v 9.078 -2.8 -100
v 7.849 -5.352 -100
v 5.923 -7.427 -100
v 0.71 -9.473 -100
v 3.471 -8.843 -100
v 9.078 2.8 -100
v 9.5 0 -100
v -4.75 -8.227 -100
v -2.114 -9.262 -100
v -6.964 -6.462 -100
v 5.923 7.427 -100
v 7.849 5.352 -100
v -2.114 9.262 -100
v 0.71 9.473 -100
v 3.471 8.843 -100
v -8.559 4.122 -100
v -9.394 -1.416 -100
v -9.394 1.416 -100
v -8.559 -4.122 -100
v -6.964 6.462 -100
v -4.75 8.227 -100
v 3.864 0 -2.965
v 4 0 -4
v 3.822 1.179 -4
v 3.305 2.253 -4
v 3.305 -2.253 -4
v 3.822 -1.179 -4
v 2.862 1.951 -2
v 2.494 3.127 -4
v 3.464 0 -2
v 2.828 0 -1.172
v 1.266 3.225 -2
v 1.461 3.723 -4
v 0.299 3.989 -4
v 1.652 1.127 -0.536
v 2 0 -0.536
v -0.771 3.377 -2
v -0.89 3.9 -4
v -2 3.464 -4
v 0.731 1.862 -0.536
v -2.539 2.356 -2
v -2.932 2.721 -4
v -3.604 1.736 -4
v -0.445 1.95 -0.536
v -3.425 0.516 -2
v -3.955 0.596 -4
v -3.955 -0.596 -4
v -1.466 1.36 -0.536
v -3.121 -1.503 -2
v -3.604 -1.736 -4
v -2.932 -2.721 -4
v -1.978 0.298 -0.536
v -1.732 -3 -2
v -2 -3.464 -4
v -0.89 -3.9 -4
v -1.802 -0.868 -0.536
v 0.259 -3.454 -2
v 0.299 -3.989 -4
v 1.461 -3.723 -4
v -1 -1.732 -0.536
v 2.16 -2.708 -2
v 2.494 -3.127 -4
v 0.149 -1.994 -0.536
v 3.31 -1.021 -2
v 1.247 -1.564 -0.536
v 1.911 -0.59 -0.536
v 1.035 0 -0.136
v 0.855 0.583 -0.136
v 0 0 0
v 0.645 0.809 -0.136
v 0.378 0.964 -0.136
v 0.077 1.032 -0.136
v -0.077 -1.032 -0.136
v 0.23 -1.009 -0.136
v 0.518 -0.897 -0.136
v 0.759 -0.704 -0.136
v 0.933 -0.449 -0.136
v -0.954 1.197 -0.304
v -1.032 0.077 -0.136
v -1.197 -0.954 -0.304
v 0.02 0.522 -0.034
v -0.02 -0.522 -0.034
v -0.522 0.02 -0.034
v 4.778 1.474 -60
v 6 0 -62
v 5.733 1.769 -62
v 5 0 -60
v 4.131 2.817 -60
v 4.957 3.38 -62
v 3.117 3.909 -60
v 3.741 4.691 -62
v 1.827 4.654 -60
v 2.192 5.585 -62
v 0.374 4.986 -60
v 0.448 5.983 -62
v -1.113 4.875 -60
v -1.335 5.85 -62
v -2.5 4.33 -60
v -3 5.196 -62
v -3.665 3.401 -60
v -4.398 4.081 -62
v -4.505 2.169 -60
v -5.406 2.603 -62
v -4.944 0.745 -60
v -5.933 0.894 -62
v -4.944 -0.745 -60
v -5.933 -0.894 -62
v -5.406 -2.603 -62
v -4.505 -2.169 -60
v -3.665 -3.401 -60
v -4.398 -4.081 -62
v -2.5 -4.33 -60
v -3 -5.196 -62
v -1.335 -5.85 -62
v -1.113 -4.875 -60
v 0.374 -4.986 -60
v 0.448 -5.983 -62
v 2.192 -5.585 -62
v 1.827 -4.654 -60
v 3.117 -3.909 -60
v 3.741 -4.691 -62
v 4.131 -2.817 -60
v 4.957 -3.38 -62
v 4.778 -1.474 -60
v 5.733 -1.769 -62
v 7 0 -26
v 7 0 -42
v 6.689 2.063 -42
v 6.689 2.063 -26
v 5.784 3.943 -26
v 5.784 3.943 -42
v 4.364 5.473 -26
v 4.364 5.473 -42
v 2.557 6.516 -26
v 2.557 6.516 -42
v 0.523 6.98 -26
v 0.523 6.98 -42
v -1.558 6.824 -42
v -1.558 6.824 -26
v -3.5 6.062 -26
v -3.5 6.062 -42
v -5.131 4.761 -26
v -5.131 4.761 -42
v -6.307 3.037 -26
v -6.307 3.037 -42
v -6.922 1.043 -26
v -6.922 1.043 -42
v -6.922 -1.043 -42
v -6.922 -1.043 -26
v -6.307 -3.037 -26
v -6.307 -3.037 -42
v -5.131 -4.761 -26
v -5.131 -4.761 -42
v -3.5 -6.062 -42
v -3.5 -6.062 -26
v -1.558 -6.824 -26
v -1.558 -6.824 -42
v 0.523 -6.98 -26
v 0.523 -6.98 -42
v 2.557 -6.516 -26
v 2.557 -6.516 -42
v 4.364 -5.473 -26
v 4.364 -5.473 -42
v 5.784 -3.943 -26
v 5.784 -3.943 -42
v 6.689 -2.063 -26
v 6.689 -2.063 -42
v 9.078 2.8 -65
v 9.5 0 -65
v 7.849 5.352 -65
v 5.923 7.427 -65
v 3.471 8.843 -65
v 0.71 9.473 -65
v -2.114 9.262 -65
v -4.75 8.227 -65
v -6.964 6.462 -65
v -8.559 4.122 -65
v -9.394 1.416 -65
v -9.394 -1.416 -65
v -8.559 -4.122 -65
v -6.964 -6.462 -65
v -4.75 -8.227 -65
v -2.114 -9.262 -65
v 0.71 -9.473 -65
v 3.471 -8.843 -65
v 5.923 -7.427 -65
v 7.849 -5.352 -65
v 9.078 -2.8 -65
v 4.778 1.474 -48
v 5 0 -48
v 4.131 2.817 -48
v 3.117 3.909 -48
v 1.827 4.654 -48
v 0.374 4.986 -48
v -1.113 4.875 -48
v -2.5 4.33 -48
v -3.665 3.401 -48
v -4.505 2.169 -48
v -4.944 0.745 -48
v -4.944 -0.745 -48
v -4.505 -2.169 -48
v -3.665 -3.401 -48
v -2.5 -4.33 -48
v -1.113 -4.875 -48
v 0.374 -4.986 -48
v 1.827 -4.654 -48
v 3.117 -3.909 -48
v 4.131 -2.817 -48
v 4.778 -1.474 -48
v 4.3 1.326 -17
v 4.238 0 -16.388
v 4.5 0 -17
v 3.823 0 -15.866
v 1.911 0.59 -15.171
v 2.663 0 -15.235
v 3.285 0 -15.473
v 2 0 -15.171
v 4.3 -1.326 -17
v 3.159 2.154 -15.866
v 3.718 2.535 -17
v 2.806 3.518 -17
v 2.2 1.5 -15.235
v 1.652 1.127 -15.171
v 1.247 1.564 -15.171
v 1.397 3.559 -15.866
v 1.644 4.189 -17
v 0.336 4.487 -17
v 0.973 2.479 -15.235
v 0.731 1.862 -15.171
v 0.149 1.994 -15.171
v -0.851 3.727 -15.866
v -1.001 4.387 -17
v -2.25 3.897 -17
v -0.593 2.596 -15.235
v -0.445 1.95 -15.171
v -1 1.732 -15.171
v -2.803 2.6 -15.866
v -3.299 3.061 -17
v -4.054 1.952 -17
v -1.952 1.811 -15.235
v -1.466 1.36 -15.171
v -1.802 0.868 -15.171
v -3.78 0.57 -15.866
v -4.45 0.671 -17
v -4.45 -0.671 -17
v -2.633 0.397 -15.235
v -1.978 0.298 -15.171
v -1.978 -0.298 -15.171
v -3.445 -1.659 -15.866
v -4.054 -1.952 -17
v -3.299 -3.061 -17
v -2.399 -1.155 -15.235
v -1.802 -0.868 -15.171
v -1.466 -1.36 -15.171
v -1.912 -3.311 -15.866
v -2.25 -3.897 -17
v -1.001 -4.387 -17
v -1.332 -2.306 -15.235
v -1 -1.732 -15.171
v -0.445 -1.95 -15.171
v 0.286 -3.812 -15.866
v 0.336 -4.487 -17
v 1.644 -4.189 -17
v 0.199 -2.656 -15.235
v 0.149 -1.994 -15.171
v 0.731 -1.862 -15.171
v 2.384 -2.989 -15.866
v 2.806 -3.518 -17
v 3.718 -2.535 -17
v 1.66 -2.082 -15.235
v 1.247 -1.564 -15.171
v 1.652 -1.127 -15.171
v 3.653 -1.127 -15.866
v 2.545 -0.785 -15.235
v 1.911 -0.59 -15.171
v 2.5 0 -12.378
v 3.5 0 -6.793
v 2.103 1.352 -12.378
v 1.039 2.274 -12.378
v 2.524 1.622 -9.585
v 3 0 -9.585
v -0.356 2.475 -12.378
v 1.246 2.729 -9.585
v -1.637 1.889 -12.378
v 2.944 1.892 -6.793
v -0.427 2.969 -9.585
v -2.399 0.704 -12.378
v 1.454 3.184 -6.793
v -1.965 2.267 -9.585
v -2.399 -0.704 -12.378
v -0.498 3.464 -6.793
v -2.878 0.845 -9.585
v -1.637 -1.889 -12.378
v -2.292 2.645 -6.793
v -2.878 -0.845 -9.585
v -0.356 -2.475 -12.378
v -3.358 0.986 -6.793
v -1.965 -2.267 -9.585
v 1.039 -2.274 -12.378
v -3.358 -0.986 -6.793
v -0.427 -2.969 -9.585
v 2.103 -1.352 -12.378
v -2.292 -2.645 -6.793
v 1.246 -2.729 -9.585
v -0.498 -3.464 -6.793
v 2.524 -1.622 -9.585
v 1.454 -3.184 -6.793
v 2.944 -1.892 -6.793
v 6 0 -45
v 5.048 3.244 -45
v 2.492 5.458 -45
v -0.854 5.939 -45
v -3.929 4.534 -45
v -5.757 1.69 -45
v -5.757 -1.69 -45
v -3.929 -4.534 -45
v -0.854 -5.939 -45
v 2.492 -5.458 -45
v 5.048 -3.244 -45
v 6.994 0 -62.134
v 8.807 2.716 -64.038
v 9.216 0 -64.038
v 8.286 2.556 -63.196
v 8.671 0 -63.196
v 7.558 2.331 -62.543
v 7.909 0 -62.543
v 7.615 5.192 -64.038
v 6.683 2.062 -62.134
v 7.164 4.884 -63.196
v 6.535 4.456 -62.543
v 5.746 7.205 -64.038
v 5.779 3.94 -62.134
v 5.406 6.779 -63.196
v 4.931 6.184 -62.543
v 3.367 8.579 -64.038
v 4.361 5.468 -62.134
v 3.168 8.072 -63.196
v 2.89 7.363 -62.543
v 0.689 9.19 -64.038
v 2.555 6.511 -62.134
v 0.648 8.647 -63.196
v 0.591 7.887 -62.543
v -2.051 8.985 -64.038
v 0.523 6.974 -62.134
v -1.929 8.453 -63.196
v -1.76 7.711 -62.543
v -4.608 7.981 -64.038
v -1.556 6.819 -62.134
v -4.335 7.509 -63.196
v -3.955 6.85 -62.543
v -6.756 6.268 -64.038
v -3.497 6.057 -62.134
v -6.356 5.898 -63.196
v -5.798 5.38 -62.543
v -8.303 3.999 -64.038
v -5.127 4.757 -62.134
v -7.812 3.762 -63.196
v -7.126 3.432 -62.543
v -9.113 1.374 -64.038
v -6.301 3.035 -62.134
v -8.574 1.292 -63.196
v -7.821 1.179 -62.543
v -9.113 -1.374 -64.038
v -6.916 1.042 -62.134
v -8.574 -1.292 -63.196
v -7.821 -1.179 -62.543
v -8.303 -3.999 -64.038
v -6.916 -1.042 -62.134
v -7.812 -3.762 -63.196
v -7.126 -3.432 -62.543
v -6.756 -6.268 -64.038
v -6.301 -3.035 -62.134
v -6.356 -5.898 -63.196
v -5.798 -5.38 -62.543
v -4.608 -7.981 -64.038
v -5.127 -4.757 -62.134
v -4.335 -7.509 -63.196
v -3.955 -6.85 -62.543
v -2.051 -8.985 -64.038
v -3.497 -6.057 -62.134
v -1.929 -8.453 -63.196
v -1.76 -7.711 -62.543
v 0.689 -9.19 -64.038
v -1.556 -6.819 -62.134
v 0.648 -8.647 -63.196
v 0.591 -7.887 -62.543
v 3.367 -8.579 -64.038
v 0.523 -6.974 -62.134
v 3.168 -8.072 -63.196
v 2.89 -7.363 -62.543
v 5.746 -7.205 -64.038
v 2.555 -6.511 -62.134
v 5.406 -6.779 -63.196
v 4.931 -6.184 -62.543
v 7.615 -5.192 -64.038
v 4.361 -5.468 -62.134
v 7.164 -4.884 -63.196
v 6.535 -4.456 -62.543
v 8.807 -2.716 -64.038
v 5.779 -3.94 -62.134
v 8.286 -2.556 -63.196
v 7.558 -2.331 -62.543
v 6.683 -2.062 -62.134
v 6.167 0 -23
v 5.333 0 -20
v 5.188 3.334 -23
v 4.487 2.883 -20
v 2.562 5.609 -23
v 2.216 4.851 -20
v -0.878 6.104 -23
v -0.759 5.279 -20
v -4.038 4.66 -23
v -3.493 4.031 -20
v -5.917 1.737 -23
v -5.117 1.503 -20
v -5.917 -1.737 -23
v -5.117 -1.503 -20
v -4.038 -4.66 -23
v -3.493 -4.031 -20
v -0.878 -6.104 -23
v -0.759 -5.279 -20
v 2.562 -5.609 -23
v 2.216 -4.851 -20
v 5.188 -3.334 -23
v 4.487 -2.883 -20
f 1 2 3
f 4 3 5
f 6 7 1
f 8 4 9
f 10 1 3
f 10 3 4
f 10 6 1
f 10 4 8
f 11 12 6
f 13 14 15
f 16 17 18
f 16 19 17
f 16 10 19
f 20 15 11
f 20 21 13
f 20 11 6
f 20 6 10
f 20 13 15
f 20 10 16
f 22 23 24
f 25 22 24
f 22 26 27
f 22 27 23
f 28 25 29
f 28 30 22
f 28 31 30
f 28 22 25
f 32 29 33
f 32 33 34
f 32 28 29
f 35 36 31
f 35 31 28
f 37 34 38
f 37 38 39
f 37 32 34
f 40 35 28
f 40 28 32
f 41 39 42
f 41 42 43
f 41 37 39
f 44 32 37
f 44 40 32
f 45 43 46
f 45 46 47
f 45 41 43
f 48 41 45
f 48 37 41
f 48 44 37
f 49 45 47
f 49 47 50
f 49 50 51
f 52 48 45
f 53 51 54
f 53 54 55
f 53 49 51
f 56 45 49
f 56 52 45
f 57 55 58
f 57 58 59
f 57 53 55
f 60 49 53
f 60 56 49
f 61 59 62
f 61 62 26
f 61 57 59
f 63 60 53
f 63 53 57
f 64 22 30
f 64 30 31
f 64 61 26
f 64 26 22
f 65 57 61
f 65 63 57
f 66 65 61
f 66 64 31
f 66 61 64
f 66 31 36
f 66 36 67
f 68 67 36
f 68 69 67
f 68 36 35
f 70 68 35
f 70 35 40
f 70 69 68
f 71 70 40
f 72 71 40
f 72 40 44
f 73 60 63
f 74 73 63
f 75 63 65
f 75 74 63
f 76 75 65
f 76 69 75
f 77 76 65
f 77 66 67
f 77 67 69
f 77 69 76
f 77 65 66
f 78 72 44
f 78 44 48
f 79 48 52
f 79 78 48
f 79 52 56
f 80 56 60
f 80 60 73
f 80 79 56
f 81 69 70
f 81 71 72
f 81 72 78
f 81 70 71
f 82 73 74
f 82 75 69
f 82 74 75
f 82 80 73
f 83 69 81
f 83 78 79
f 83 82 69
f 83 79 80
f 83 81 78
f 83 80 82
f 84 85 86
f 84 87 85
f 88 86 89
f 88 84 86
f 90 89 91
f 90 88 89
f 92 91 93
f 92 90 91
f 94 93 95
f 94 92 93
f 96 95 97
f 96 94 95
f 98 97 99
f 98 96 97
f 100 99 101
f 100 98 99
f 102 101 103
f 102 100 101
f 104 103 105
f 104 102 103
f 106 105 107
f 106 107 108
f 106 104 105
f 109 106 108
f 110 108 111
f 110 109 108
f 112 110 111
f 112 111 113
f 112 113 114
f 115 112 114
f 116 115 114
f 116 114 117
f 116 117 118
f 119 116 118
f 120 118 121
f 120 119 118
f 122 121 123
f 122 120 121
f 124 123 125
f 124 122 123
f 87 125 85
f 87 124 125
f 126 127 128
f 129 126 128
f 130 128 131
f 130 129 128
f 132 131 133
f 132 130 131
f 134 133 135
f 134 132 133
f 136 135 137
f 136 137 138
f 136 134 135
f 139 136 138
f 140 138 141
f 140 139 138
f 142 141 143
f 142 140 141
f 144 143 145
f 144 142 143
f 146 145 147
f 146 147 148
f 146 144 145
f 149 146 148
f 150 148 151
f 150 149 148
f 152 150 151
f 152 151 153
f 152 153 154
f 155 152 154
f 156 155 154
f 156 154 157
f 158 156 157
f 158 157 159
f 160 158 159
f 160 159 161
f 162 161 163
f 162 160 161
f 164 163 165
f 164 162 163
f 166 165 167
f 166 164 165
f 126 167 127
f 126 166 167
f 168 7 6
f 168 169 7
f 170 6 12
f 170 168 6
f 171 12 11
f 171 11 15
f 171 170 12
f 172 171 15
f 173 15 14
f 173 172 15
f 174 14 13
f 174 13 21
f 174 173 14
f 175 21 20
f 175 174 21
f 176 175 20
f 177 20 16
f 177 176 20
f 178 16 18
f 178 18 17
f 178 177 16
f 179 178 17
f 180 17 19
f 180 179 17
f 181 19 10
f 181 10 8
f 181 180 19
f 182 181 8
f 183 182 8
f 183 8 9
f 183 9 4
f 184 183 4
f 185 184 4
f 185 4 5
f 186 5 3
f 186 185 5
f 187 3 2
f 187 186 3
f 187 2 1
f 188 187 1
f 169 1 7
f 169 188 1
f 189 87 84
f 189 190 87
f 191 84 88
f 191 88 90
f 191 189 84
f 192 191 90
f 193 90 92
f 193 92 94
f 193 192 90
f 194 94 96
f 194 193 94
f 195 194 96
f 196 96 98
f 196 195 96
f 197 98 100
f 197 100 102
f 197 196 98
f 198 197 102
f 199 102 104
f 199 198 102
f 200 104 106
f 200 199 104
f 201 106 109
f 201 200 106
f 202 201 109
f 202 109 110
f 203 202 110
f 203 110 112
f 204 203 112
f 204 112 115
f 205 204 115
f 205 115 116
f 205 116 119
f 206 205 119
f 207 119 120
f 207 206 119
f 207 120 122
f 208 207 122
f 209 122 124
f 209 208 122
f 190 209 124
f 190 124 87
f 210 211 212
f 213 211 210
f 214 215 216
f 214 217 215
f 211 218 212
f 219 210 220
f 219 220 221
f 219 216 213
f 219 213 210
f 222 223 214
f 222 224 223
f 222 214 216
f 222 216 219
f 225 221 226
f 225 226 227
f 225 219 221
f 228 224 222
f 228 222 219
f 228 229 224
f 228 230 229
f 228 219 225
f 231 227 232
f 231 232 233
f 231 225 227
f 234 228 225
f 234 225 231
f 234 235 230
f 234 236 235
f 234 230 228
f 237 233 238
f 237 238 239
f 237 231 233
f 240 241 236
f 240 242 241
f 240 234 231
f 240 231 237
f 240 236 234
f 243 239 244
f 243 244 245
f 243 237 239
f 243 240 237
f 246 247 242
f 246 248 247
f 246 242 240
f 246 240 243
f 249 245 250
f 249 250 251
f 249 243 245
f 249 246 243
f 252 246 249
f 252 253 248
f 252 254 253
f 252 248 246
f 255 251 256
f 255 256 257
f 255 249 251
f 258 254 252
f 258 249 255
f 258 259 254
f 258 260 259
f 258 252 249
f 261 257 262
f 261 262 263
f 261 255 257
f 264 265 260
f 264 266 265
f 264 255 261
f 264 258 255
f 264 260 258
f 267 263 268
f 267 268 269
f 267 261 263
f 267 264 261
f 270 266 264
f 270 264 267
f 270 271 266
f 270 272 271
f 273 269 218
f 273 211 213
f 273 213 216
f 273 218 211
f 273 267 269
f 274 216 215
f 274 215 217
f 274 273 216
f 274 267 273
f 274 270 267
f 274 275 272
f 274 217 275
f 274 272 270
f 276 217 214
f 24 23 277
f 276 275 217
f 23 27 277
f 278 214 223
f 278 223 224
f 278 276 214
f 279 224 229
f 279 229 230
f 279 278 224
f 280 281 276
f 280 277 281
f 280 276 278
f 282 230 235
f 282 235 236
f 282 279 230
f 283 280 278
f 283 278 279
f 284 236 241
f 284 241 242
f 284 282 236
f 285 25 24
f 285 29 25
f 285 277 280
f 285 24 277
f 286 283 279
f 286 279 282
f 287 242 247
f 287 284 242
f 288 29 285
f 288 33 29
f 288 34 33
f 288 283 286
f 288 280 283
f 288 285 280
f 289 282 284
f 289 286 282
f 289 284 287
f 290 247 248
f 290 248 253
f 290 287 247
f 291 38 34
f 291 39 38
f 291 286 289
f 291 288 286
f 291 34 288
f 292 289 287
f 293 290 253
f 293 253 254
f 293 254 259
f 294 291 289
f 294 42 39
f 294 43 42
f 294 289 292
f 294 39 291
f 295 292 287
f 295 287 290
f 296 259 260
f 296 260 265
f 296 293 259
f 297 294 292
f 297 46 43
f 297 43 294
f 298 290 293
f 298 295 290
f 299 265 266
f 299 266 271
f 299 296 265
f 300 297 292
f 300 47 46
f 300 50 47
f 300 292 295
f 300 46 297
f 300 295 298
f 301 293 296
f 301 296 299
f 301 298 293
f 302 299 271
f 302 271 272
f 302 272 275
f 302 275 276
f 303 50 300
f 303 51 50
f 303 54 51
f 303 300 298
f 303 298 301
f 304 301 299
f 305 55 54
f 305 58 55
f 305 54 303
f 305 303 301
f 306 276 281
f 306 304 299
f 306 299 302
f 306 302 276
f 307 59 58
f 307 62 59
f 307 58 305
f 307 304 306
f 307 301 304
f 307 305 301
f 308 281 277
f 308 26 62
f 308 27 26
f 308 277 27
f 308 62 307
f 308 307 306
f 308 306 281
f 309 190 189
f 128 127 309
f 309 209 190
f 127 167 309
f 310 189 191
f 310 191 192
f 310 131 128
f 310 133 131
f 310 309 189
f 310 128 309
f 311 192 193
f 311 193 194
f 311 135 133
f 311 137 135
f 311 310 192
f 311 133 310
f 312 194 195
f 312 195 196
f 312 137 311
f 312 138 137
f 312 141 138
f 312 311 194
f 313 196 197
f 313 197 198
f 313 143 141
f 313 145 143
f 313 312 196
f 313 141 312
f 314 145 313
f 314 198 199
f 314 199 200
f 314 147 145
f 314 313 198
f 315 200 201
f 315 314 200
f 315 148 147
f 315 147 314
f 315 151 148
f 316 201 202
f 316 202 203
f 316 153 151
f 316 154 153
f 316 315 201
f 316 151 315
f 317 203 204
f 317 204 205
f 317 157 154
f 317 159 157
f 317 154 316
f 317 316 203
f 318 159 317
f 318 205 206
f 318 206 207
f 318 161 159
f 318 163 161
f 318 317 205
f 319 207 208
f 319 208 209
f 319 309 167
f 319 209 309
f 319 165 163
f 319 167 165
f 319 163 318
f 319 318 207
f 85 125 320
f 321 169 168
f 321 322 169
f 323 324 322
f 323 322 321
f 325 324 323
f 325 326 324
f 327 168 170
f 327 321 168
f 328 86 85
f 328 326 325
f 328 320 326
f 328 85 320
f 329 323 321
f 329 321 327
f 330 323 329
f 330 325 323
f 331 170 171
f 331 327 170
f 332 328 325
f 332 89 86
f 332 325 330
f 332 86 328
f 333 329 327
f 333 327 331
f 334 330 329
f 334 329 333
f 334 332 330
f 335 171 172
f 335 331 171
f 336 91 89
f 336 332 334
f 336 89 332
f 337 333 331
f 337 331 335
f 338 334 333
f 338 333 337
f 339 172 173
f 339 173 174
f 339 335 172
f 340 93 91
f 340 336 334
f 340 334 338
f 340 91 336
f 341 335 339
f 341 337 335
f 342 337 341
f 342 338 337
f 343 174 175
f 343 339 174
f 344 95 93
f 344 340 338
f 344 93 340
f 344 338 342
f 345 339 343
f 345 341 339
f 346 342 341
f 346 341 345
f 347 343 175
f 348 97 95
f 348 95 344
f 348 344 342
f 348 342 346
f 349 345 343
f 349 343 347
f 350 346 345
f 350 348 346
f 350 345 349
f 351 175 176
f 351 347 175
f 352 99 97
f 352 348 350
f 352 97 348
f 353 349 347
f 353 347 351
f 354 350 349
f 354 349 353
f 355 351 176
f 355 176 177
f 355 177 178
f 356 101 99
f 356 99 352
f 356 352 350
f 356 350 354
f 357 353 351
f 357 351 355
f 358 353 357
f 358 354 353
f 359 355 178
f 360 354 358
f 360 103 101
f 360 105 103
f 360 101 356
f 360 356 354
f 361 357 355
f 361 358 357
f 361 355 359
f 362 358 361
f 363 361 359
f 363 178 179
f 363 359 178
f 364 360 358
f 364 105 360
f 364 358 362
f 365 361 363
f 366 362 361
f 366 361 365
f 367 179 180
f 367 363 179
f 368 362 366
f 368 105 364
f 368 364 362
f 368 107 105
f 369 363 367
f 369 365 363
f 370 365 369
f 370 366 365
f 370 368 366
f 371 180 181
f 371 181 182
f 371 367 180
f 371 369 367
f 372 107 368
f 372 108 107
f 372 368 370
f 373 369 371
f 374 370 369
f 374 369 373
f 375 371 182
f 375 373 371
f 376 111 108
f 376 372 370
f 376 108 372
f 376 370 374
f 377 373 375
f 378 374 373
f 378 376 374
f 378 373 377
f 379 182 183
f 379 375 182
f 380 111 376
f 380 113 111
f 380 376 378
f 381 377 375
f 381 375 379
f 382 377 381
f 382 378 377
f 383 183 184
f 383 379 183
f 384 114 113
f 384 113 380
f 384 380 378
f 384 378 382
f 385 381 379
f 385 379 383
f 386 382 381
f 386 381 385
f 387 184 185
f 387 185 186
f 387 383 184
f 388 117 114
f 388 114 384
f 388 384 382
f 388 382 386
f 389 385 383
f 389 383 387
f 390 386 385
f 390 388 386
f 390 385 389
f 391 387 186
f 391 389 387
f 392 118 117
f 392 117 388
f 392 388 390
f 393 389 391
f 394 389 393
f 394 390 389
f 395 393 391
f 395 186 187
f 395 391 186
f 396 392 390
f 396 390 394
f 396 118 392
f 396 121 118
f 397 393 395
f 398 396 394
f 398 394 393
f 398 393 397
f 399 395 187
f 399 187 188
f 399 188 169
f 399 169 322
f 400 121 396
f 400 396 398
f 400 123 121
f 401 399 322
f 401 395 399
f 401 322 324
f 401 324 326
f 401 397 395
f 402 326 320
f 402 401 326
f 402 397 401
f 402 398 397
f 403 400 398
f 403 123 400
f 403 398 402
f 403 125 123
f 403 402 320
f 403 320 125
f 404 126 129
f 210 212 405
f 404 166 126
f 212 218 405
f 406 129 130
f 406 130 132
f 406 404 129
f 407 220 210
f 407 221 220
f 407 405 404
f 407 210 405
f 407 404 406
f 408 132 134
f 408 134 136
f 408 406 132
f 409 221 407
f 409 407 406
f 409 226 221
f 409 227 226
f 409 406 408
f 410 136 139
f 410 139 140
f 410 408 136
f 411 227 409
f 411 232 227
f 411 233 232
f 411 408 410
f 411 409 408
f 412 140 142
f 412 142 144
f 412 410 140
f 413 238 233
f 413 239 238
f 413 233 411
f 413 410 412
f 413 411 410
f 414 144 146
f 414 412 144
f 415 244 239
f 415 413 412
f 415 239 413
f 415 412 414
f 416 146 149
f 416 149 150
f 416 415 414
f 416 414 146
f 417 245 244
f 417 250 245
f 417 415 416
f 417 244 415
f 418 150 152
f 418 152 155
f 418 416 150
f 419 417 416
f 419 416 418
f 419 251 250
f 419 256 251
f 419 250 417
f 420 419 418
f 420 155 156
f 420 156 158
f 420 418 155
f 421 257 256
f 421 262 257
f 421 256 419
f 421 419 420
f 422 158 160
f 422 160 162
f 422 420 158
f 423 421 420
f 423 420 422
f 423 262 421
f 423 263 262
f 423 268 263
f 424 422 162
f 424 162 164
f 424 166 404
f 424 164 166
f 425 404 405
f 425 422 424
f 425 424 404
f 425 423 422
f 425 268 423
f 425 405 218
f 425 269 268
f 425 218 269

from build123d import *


with BuildPart() as f1:
    # F0 (on Front) → F1 (revolve)
    with BuildSketch(Plane.XZ):
        with BuildLine():
            Line((2, -15.170774), (4, -4))
            ThreePointArc((4, -4), (2.828427, -1.171573), (0, 0))
            Line((0, 0), (0, -100))
            Line((0, -100), (9.5, -100))
            Line((9.5, -100), (9.5, -65))
            ThreePointArc((9.5, -65), (8.313642, -62.842418), (6, -62))
            Line((6, -62), (5, -60))
            Line((5, -60), (5, -48))
            Line((5, -48), (7, -42))
            Line((7, -42), (7, -26))
            Line((7, -26), (4.5, -17))
            ThreePointArc((4.5, -17), (3.567458, -15.651518), (2, -15.170774))
        make_face()
    revolve(axis=Axis((0, 0, -50), (0, 0, 1)))


solid = f1.part
